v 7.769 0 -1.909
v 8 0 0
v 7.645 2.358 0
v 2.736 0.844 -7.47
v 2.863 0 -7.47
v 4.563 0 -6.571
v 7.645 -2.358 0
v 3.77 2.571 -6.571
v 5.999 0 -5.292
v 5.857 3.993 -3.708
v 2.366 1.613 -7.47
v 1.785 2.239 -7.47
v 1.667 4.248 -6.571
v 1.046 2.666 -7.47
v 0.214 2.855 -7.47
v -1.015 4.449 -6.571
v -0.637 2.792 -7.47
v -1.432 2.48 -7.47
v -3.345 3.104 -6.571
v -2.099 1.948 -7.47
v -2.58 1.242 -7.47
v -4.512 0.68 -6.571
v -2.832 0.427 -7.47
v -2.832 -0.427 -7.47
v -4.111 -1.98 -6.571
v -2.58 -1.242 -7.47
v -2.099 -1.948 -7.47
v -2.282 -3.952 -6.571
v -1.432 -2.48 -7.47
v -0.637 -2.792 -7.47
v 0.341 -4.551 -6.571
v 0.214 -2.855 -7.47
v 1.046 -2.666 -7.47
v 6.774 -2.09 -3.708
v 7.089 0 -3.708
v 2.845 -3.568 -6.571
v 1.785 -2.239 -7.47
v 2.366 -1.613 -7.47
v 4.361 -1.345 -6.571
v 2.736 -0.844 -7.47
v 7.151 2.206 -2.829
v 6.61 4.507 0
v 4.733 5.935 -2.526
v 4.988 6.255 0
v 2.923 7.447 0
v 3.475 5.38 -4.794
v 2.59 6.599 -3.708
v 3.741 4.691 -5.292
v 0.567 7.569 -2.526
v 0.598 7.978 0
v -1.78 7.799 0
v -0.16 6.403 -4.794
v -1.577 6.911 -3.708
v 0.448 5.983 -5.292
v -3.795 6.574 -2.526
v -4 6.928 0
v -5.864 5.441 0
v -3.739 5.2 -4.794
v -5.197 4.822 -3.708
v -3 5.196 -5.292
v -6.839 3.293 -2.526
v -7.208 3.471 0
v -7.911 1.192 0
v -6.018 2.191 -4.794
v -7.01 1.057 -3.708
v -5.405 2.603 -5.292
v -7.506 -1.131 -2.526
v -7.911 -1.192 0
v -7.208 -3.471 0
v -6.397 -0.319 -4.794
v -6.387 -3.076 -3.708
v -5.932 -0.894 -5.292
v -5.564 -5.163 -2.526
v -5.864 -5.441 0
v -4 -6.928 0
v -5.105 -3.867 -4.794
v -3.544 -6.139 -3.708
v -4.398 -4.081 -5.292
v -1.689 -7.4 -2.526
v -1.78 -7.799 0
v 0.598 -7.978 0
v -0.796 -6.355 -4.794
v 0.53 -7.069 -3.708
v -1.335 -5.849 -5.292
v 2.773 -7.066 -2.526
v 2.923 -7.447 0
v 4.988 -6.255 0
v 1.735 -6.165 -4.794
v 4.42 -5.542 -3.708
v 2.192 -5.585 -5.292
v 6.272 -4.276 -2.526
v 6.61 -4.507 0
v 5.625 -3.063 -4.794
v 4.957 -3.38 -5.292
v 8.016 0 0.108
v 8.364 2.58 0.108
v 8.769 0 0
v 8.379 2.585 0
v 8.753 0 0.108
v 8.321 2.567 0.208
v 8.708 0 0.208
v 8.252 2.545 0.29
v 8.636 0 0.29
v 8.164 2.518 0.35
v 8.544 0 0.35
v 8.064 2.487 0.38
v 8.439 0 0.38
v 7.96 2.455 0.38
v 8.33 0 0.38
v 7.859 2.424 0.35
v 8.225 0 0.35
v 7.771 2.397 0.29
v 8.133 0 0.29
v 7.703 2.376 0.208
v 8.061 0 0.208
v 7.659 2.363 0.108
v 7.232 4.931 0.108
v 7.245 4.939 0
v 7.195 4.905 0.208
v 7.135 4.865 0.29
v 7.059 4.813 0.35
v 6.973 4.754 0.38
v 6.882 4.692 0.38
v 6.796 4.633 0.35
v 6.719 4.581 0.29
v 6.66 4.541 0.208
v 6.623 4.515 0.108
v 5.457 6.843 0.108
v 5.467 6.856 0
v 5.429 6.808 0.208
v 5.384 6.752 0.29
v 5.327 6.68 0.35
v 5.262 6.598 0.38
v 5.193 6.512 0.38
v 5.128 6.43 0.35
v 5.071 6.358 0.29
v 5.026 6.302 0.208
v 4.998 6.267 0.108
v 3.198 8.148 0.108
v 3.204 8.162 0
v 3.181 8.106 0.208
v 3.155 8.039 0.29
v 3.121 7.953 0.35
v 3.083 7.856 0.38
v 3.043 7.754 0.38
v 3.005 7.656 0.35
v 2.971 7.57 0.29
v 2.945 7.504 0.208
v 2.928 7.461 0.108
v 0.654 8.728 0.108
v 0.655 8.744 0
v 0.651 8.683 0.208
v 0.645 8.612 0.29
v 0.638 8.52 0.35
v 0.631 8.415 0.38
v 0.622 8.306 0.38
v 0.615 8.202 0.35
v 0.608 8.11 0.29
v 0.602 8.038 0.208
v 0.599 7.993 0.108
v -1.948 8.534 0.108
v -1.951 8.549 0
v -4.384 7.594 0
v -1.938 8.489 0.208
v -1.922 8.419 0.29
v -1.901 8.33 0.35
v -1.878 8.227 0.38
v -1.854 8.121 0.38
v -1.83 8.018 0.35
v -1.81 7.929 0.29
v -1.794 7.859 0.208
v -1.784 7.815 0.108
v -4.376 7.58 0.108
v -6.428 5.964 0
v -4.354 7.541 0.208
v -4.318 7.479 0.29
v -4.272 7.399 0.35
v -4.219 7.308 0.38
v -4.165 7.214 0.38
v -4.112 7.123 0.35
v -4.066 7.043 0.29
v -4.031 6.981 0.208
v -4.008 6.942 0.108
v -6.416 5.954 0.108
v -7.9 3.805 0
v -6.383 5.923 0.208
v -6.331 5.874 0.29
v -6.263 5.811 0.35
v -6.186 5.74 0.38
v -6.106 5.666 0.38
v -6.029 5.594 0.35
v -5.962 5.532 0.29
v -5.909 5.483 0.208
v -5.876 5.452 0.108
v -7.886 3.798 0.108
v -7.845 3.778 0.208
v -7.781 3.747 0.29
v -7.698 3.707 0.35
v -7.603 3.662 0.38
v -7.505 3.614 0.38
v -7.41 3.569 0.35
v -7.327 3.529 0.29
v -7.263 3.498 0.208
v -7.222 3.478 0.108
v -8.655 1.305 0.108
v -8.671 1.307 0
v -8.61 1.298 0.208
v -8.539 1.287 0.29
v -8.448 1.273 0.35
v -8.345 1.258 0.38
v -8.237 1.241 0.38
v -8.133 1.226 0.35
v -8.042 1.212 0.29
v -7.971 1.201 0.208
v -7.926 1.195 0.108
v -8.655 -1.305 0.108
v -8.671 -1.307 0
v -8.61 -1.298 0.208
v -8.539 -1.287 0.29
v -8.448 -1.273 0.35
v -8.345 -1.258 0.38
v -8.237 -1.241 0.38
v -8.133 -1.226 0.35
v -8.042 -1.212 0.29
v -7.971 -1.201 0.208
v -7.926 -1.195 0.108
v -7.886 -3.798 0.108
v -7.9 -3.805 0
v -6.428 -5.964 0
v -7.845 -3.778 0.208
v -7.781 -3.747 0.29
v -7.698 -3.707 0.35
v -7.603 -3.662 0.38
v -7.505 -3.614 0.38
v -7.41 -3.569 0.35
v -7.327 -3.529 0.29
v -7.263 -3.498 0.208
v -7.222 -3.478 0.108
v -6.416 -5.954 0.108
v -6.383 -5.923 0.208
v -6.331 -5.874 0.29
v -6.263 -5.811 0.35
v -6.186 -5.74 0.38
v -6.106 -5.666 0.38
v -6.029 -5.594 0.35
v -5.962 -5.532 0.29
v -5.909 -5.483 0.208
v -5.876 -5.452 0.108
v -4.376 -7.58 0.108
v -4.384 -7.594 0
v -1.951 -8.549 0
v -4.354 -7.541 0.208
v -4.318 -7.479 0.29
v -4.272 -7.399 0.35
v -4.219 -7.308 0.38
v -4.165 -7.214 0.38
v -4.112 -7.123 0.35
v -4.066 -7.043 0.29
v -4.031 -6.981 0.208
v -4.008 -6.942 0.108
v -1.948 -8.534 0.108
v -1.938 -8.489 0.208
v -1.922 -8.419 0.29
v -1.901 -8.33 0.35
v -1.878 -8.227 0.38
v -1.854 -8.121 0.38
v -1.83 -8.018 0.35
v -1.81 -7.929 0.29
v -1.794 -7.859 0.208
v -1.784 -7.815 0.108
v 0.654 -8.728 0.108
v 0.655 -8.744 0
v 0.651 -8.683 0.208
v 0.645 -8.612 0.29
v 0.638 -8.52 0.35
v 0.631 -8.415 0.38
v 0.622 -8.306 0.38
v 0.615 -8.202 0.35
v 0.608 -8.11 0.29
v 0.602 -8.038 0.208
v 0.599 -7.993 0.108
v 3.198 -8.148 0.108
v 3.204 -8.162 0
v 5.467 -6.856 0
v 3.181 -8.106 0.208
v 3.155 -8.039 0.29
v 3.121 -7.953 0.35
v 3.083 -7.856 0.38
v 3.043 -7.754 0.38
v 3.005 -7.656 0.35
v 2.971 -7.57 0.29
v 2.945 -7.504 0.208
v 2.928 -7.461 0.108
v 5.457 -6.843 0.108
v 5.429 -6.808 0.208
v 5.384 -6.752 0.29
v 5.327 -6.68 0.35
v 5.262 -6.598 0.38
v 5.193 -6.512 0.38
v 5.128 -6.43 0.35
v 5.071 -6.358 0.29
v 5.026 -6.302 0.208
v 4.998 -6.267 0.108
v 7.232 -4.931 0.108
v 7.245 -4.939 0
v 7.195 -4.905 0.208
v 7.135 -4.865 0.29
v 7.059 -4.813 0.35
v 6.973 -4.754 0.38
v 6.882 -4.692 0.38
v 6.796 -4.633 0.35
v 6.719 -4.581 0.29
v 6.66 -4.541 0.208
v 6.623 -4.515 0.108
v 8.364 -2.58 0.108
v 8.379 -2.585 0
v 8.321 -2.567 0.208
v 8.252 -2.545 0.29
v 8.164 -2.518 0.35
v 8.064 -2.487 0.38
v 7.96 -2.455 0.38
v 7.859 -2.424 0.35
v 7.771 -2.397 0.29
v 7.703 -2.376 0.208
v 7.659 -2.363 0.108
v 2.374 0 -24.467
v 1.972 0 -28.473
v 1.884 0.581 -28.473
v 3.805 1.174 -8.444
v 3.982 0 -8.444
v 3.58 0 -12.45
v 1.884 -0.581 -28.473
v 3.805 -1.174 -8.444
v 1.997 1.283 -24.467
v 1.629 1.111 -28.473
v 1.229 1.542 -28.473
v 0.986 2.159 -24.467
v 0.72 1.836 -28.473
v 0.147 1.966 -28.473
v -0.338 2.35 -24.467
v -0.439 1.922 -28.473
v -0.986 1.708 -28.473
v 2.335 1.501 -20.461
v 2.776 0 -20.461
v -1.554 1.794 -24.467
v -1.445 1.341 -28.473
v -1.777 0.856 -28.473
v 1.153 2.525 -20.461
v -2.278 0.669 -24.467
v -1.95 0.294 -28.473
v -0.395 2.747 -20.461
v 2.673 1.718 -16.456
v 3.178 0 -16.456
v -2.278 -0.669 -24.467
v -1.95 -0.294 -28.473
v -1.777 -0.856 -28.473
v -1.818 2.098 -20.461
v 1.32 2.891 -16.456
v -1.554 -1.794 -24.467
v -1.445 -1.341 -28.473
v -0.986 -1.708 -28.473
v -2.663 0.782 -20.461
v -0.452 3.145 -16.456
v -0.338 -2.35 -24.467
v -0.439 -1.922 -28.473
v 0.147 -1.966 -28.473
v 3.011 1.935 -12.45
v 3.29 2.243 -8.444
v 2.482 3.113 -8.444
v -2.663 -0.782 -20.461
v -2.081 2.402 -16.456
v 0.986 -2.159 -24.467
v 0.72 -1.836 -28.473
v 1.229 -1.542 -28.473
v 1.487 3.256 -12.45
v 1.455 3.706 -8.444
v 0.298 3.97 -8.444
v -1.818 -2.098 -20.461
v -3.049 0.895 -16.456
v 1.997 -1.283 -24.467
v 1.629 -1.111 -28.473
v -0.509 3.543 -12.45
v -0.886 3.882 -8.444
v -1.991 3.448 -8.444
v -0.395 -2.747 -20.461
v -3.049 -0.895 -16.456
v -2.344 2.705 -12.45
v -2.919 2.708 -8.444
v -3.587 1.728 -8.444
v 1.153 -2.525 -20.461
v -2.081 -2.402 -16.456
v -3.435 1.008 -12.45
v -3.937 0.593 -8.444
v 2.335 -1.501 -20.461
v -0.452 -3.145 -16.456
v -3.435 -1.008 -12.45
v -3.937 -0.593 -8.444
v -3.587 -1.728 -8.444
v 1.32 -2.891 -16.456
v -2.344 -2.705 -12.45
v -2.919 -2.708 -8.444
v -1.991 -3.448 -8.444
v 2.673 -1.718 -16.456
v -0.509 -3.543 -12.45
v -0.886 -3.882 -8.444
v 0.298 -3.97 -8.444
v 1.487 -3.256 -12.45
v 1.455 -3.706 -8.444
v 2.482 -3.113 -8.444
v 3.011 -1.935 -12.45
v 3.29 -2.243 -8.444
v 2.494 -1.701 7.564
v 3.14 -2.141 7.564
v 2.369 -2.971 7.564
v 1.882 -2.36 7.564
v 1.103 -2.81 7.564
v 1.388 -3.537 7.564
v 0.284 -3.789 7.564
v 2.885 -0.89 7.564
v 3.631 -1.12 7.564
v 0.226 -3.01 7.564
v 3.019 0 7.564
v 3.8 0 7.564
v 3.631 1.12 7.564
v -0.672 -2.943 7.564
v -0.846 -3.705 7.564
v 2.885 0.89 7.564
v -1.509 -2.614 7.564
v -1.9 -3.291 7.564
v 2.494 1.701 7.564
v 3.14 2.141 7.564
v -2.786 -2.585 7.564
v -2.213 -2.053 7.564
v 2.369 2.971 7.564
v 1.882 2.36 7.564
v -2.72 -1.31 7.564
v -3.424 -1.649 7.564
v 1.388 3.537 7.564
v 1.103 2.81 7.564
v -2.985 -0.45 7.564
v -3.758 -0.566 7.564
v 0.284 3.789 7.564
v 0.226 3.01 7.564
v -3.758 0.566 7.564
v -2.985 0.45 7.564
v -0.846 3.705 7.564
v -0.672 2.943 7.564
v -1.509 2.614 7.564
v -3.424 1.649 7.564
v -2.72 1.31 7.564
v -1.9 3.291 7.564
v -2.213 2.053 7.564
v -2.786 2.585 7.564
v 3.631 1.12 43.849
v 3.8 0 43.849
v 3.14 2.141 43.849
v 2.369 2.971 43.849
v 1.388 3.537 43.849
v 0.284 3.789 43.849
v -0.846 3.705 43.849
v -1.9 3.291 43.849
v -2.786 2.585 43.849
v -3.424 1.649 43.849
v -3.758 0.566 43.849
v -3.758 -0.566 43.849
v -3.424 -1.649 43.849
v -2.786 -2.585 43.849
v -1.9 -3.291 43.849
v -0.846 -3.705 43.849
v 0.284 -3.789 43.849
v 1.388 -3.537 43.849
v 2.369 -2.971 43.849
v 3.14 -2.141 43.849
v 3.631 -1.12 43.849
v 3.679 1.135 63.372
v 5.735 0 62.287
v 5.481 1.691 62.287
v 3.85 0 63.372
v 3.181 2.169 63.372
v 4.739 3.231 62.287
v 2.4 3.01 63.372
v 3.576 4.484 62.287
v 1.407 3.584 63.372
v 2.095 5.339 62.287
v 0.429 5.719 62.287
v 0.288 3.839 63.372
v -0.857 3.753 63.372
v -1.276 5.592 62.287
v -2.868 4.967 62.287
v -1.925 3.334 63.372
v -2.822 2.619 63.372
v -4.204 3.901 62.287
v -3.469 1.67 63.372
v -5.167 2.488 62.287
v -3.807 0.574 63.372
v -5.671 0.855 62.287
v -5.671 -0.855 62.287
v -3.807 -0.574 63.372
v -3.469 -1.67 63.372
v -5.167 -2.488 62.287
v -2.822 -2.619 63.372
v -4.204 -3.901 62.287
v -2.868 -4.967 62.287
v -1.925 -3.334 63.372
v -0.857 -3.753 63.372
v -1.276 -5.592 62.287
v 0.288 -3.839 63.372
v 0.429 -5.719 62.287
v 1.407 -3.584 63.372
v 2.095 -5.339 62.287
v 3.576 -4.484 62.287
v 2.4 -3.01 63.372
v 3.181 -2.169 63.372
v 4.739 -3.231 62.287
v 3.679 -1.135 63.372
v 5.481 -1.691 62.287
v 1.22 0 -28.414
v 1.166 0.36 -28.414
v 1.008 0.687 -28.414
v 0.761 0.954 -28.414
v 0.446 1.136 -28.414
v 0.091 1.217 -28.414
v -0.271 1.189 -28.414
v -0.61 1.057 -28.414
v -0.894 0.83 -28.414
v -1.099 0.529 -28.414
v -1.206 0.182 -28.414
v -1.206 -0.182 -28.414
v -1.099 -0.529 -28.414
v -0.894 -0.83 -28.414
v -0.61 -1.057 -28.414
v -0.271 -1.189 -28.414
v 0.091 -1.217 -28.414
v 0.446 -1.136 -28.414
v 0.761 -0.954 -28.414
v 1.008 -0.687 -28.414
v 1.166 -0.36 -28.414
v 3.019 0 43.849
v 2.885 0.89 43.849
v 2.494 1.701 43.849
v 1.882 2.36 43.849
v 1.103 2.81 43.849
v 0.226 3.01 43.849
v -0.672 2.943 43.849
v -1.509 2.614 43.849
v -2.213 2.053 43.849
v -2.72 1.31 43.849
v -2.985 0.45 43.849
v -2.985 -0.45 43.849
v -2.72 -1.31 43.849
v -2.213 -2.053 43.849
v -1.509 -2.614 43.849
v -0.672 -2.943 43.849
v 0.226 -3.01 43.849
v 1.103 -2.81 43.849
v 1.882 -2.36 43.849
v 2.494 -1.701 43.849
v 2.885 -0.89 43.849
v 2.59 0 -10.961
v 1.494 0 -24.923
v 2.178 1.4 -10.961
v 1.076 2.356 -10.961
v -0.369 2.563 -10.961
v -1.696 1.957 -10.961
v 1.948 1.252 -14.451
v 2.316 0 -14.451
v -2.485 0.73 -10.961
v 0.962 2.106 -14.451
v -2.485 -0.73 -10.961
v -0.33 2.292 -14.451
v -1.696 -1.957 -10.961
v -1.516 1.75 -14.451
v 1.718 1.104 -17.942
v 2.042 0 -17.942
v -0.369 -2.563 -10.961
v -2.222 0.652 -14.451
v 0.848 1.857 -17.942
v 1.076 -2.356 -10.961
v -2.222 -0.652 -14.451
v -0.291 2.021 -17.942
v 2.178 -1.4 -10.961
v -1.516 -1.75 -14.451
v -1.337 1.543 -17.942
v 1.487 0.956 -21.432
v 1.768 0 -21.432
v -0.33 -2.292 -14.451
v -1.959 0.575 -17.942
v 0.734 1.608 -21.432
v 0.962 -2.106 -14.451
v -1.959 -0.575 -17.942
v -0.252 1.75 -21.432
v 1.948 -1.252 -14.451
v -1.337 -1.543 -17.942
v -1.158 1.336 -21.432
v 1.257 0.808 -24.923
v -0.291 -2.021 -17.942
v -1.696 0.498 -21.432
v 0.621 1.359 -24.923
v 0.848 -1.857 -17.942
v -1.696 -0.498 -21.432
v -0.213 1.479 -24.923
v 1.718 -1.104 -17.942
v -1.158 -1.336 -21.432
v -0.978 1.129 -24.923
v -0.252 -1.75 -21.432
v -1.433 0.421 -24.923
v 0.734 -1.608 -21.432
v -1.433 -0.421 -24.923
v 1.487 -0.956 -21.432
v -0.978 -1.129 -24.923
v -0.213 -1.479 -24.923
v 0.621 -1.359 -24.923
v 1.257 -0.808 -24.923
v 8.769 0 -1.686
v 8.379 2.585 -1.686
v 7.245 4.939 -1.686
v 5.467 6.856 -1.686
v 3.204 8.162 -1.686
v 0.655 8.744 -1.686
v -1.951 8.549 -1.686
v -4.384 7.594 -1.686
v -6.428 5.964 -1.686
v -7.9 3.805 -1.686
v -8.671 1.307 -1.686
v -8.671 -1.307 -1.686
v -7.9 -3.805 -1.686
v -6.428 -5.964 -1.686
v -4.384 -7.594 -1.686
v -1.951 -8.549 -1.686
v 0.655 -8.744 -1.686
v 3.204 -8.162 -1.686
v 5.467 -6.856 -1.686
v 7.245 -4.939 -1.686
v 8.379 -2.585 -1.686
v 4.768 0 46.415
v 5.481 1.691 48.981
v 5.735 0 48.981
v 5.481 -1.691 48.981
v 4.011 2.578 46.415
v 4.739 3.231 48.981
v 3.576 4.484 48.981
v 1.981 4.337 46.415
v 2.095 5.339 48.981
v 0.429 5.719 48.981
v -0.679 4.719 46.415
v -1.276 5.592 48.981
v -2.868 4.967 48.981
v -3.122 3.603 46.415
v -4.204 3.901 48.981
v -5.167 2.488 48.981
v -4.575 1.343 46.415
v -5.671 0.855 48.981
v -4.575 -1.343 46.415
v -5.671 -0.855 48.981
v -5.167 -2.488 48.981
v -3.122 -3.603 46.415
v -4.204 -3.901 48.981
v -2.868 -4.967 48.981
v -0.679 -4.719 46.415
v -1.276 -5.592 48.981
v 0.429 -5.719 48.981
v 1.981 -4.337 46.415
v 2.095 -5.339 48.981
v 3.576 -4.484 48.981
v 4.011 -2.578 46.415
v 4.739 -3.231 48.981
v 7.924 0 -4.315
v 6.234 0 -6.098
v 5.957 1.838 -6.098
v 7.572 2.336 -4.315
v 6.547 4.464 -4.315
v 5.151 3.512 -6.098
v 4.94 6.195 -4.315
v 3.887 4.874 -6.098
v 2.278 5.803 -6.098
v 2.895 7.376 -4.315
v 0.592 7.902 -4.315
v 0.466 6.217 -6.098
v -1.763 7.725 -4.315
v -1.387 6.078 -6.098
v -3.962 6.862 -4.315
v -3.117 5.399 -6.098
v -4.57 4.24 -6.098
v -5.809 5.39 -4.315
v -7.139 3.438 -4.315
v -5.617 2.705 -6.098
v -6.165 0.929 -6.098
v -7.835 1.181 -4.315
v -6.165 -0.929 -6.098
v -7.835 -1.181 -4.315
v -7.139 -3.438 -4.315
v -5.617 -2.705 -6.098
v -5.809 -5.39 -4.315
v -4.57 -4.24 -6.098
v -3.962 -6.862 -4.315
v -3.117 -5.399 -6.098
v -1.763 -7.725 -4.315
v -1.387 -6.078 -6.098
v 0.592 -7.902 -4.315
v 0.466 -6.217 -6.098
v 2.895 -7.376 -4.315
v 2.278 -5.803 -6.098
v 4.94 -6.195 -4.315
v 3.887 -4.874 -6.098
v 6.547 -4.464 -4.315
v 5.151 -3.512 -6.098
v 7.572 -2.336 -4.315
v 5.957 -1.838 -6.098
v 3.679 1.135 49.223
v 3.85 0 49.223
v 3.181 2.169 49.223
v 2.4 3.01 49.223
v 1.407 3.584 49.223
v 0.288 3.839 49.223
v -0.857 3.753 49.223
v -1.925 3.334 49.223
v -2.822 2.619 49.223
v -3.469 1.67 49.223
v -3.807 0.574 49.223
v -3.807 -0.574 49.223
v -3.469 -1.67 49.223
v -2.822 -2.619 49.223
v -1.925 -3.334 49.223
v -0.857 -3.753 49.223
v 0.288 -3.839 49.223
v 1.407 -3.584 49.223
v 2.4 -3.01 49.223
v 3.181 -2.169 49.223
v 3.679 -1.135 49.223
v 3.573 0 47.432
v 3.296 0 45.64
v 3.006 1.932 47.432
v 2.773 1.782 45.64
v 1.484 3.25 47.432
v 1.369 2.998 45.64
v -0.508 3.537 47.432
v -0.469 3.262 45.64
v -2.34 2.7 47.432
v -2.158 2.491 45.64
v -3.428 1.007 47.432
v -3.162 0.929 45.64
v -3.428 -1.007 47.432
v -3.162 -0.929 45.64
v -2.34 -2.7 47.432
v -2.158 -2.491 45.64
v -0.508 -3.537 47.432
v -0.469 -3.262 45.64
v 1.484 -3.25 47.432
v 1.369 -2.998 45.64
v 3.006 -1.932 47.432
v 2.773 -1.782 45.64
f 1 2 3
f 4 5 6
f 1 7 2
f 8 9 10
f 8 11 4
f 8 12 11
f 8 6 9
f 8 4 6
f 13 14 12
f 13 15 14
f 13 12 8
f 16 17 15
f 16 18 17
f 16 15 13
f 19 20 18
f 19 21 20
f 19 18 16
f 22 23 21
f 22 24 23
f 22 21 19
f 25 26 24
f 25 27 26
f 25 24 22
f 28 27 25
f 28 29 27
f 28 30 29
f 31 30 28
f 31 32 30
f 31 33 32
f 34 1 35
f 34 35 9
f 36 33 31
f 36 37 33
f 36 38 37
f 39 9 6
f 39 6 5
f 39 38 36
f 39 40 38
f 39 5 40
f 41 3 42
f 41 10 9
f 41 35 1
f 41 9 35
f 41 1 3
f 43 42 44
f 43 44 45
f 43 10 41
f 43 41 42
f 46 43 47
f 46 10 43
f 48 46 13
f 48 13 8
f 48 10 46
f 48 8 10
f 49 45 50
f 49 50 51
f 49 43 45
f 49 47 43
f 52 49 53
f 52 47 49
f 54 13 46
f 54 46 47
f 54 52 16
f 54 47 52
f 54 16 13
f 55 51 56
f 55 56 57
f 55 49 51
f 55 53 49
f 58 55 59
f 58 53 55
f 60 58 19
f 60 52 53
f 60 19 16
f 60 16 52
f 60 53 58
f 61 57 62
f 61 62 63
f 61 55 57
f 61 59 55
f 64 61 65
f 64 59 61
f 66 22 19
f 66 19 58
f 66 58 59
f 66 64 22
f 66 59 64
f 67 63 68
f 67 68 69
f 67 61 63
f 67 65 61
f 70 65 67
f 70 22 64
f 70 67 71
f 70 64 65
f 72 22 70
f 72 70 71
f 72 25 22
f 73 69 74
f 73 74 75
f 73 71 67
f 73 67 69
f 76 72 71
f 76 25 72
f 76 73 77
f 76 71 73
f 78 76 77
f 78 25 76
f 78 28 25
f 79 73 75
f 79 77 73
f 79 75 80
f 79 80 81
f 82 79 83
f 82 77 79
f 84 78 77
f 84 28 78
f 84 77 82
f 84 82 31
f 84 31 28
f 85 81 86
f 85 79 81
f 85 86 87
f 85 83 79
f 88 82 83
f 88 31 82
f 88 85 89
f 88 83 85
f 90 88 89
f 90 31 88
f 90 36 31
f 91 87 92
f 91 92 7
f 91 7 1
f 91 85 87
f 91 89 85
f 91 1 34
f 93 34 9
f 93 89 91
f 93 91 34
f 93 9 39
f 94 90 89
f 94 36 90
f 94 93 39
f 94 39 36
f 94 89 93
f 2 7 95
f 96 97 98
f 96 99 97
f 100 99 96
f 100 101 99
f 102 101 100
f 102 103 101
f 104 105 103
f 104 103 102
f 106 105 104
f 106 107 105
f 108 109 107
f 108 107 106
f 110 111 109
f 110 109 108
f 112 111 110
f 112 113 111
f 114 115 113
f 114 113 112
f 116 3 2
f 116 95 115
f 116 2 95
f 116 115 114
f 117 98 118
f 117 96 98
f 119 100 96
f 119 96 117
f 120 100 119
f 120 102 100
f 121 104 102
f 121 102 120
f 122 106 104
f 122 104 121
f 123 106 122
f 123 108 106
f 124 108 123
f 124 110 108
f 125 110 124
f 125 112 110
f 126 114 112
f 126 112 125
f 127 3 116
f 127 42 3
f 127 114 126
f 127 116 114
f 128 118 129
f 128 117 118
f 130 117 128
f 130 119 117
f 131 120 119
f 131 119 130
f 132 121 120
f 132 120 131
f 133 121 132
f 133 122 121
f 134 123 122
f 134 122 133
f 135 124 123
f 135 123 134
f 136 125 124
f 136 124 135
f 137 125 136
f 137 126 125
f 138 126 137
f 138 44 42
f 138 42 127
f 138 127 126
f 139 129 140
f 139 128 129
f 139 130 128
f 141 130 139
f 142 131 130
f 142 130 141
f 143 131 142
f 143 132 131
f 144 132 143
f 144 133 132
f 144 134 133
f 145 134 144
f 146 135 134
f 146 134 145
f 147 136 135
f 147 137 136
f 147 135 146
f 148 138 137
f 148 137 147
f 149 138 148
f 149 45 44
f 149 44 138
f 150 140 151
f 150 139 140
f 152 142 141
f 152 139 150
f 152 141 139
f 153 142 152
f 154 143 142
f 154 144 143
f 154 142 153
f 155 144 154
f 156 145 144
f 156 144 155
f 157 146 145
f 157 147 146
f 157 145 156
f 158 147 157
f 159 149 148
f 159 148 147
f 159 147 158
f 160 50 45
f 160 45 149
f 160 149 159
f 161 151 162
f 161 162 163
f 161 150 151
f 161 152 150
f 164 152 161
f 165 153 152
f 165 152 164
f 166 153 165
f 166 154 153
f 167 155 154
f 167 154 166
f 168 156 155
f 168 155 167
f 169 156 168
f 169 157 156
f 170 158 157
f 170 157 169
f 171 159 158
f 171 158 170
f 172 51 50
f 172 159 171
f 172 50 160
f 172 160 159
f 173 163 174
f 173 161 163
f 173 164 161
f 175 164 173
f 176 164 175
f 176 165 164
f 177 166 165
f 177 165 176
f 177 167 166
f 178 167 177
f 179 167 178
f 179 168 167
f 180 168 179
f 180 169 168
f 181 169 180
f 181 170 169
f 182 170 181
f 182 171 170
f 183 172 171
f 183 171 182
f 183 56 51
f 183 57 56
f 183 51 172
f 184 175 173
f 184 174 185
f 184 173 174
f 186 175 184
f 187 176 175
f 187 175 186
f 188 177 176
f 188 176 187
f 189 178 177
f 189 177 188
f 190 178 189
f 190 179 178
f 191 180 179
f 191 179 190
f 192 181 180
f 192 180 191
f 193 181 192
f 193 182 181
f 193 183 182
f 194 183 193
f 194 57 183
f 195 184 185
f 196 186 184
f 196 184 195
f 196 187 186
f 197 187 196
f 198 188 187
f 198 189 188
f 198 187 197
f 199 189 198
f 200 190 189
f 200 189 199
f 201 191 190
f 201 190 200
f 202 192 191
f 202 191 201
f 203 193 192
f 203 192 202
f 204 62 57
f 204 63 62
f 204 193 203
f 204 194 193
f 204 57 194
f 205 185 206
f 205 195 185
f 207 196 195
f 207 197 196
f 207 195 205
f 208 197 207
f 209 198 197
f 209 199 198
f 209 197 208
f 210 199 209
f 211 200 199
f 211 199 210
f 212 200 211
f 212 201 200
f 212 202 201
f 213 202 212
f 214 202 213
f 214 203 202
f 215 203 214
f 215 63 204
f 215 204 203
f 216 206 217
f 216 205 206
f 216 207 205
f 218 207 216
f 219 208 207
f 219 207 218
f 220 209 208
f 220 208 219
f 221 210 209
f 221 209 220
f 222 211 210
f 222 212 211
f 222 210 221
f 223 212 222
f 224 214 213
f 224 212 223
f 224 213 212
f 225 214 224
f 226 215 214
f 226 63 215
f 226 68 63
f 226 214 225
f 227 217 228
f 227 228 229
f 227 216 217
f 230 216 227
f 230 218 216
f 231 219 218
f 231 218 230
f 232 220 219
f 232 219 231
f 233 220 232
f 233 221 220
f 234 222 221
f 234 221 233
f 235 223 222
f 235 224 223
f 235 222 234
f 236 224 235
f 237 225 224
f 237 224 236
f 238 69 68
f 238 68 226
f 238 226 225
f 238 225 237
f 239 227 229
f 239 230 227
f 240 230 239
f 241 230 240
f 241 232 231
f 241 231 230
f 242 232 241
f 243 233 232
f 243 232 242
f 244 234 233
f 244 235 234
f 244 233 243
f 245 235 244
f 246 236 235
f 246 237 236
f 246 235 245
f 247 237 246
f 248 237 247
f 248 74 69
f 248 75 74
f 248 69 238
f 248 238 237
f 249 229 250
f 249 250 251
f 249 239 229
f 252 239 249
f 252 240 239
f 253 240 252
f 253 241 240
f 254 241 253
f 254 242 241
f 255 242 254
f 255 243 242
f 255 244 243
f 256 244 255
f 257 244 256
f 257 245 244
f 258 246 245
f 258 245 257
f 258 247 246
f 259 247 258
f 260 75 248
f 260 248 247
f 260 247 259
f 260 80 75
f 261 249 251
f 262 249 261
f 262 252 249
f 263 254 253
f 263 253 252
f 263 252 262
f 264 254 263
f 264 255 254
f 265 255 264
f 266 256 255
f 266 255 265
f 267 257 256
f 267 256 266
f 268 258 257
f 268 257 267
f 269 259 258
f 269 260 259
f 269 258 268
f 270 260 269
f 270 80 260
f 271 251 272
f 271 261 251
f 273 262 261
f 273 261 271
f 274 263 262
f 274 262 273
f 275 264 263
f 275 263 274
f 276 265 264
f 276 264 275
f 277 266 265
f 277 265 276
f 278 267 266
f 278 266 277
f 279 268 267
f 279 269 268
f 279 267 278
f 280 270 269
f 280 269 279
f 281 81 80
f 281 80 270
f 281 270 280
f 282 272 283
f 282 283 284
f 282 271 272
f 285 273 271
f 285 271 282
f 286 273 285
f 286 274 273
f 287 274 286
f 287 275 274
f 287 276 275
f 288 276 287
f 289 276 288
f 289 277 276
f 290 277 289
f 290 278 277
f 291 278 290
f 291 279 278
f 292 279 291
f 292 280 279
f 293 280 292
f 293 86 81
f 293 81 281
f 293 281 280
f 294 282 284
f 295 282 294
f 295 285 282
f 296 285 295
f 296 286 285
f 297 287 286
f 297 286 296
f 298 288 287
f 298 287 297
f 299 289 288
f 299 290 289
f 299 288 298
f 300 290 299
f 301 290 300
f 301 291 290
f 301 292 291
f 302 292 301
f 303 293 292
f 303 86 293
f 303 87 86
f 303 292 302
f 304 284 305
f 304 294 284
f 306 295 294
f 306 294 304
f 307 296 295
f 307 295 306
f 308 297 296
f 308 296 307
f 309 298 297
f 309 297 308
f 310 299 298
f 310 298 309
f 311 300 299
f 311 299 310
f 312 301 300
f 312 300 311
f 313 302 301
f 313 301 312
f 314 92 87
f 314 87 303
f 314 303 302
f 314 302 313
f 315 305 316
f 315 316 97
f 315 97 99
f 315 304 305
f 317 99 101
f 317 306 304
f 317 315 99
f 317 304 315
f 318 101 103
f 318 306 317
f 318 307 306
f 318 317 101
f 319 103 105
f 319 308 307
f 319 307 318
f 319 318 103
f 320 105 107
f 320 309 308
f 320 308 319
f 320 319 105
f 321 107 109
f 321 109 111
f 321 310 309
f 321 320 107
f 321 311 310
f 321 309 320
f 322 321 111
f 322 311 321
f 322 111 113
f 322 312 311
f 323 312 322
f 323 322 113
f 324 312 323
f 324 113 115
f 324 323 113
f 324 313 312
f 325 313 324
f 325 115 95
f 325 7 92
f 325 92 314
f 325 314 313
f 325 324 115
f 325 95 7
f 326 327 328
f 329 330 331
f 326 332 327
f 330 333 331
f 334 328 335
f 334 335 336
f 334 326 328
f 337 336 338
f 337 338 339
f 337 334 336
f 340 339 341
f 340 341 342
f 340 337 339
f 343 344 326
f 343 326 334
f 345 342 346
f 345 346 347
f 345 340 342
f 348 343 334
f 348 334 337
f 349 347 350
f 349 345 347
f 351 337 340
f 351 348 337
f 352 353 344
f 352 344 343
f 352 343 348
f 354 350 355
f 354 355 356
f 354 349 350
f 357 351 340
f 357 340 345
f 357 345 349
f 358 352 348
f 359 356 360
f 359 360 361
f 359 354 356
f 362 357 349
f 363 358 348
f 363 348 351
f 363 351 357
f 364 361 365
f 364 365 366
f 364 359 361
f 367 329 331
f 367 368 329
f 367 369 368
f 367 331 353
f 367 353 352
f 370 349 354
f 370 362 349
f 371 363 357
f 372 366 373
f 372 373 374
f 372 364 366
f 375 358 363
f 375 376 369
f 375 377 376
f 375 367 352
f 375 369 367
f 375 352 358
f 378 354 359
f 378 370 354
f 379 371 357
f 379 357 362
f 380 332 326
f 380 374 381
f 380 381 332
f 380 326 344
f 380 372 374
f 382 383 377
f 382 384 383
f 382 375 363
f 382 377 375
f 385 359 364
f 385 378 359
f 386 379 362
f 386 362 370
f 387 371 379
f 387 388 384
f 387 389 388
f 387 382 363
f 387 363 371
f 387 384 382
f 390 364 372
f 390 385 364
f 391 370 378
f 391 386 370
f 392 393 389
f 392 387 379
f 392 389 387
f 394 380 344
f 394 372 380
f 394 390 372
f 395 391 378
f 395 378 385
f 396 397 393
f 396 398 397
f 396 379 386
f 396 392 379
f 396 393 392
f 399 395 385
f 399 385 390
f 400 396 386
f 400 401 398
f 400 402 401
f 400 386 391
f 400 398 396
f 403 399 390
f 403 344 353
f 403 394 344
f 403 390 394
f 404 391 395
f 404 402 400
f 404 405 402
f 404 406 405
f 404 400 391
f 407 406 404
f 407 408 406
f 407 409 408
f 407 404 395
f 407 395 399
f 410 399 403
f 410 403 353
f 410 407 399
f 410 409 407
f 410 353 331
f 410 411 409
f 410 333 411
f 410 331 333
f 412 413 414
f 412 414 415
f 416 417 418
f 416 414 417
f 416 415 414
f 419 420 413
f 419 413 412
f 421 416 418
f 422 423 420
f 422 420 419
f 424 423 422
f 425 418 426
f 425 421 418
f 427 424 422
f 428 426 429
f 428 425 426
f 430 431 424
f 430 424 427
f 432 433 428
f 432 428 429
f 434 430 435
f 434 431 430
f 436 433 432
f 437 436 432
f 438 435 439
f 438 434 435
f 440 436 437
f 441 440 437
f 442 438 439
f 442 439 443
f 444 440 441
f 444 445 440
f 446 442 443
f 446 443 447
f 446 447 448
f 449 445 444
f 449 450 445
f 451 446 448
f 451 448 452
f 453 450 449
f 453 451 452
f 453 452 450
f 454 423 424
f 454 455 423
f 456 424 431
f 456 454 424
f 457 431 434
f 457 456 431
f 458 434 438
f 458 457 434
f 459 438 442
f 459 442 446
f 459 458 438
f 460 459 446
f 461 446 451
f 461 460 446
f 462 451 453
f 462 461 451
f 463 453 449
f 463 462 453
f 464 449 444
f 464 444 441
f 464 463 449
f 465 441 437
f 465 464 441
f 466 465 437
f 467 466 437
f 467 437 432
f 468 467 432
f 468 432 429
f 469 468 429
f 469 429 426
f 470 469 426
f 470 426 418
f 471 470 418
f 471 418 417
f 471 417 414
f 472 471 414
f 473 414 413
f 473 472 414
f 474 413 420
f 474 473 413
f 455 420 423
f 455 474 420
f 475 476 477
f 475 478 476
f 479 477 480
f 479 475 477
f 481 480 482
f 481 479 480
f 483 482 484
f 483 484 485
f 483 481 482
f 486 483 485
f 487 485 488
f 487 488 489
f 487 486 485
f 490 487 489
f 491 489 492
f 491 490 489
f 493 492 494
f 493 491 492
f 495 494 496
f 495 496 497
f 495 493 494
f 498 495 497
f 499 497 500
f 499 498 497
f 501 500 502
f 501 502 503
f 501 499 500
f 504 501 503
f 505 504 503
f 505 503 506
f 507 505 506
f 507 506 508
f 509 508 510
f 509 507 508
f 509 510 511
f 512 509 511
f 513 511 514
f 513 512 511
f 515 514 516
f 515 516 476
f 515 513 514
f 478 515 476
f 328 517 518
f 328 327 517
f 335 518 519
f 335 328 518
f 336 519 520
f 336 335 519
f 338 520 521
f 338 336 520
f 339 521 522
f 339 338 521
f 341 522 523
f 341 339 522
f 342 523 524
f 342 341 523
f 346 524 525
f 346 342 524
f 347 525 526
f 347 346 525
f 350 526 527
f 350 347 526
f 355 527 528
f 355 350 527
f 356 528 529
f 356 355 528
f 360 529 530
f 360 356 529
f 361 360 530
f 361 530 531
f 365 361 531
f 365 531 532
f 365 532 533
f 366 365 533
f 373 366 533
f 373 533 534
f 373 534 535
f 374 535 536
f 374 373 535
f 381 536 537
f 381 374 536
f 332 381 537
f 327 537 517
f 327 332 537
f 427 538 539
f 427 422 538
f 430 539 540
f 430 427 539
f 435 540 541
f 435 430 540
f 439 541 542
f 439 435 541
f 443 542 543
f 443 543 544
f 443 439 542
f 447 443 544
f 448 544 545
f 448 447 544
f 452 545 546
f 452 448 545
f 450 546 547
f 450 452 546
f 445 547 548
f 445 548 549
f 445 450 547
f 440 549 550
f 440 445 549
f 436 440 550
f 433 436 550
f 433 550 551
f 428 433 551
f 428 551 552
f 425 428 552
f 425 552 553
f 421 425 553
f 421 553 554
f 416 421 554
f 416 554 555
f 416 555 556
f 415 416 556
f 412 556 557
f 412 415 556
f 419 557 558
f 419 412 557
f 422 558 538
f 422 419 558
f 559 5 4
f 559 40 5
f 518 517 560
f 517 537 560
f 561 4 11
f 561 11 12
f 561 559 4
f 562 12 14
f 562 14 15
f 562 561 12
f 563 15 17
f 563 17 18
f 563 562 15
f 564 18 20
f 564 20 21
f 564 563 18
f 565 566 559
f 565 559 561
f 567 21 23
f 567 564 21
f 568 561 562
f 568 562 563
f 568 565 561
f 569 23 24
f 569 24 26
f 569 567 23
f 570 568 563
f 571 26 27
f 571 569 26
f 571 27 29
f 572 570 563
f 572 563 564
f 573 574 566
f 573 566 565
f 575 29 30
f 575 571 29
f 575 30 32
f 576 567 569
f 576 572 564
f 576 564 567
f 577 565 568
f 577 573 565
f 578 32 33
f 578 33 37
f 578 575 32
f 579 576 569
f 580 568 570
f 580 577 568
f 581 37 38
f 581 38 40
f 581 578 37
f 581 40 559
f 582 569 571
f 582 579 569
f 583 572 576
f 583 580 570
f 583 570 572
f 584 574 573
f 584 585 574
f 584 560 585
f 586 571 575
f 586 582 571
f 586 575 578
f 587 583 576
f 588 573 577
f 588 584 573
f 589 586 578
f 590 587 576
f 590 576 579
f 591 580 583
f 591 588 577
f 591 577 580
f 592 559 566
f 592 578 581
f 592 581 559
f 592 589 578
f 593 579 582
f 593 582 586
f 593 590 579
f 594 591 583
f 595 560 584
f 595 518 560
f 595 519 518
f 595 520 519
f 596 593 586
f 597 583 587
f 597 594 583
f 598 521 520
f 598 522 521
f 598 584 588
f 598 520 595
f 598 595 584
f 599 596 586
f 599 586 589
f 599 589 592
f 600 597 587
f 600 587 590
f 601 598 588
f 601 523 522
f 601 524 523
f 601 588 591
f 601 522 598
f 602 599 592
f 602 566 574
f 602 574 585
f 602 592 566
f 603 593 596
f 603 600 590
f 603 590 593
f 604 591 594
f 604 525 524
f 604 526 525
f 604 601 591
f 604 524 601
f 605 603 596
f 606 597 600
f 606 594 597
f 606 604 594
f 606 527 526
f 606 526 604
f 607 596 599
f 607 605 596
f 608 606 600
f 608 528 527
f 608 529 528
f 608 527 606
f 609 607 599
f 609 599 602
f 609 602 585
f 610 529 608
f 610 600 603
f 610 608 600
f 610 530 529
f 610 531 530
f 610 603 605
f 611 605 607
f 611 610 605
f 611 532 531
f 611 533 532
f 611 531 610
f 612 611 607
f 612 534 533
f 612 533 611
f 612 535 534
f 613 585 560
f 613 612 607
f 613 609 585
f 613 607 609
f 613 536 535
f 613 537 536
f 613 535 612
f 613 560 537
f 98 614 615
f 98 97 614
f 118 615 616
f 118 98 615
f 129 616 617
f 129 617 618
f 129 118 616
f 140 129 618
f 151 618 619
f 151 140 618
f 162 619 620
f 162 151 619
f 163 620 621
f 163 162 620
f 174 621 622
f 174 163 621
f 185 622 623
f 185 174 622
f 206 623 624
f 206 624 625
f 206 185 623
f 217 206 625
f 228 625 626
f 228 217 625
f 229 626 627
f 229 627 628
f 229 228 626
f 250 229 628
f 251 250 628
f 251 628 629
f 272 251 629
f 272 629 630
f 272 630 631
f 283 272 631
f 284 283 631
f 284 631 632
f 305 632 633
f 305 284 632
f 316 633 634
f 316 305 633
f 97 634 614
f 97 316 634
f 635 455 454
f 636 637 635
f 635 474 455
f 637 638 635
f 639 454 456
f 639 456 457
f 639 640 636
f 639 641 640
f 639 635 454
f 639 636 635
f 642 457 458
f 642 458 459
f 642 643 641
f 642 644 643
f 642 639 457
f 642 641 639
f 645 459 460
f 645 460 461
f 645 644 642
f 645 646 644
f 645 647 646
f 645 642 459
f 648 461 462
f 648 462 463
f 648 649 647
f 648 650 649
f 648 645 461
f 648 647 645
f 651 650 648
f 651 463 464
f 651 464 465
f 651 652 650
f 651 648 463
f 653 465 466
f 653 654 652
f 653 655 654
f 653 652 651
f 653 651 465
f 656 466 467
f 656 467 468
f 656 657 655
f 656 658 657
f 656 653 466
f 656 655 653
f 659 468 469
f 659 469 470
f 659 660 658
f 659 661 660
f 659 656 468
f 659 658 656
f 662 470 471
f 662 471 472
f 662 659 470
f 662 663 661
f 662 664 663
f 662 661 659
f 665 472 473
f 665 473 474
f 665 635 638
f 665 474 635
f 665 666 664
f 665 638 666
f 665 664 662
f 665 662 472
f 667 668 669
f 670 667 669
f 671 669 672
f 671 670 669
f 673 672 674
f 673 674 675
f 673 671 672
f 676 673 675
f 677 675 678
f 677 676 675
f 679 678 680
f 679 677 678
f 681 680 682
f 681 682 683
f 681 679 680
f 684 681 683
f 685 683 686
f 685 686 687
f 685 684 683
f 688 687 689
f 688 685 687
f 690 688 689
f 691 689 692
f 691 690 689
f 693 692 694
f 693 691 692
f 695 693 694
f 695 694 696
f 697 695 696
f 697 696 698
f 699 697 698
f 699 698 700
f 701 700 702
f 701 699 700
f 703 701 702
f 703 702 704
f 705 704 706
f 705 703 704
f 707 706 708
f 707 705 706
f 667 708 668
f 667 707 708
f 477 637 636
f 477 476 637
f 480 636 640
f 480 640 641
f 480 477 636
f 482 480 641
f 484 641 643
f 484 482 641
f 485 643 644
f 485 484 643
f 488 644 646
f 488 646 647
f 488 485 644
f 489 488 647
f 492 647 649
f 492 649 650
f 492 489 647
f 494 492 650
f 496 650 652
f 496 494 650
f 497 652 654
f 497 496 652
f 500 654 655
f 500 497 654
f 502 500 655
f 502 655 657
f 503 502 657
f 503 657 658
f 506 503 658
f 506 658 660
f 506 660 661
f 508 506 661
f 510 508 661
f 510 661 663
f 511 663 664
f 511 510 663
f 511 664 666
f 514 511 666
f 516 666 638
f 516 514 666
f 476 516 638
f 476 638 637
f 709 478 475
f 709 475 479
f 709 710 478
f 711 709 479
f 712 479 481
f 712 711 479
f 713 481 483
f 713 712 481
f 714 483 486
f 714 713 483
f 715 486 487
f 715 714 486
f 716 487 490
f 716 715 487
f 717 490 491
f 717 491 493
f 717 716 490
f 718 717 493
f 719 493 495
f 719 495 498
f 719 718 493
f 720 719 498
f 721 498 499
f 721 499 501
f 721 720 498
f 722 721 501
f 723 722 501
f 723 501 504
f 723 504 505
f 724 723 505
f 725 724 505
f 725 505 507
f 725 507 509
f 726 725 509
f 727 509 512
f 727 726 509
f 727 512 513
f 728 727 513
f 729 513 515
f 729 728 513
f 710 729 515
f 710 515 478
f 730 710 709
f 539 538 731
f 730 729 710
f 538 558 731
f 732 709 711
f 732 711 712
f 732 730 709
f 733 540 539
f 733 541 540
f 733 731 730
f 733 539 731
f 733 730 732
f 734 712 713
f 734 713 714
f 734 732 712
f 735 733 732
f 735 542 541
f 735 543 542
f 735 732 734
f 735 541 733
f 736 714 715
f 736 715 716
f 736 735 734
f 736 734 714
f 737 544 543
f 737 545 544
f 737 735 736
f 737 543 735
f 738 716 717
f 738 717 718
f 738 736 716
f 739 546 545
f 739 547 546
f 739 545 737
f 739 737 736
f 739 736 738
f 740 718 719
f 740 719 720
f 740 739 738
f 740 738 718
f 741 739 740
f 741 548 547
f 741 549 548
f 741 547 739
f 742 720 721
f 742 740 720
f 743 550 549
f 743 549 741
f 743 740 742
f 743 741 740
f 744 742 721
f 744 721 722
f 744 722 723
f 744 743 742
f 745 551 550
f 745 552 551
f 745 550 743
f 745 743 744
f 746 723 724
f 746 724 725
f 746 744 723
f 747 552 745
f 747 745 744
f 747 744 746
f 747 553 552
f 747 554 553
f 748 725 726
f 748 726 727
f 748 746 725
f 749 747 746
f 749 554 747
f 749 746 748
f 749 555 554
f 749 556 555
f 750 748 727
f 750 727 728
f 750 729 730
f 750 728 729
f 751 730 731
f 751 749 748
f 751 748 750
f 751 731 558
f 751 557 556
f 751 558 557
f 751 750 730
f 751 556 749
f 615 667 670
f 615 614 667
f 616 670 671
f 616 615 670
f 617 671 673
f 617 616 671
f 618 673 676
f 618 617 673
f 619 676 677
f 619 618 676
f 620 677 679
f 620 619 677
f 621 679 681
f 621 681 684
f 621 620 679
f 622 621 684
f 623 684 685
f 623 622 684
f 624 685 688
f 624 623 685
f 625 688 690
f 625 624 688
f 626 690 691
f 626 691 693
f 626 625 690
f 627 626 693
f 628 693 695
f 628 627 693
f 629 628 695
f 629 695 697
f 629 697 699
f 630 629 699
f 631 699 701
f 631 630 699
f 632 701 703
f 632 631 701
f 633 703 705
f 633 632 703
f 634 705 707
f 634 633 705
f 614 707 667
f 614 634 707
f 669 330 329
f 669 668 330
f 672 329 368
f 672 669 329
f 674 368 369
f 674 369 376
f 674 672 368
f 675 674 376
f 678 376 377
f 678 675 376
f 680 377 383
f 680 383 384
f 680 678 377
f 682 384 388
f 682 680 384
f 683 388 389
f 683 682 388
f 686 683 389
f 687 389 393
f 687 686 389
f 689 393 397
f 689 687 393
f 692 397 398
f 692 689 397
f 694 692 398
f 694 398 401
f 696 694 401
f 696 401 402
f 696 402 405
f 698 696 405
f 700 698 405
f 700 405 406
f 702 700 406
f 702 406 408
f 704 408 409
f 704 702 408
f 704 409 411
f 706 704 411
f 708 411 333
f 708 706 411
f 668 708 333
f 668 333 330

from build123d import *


with BuildPart() as f1:
    # F0 (on Front) → F1 (revolve)
    with BuildSketch(Plane.XZ):
        with BuildLine():
            ThreePointArc((8.768533, 0), (8.384267, 0.384267), (8, 0))
            ThreePointArc((8, 0), (6.59196, -4.532777), (2.863484, -7.469971))
            Line((2.863484, -7.469971), (1.220015, -28.413521))
            Line((1.220015, -28.413521), (1.971818, -28.472516))
            Line((1.971818, -28.472516), (3.981584, -8.444457))
            Line((3.981584, -8.444457), (6.234266, -6.097914))
            Line((6.234266, -6.097914), (7.923777, -4.31454))
            Line((7.923777, -4.31454), (8.768533, -1.686412))
            Line((8.768533, -1.686412), (8.768533, 0))
        make_face()
    revolve(axis=Axis((0, 0, -14.241969), (0, 0, 1)))


with BuildPart() as f3:
    # F2 (on Front) → F3 (revolve)
    with BuildSketch(Plane.XZ):
        Polygon((5.735391, 62.287069), (3.85, 63.372196), (3.85, 49.223183), (3.018864, 43.849036), (3.018864, 7.564358), (3.8, 7.564358), (3.8, 43.849036), (5.735391, 48.981258), align=None)
    revolve(axis=Axis((0, 0, 35.064268), (0, 0, 1)))


solid = Compound([f1.part, f3.part])
